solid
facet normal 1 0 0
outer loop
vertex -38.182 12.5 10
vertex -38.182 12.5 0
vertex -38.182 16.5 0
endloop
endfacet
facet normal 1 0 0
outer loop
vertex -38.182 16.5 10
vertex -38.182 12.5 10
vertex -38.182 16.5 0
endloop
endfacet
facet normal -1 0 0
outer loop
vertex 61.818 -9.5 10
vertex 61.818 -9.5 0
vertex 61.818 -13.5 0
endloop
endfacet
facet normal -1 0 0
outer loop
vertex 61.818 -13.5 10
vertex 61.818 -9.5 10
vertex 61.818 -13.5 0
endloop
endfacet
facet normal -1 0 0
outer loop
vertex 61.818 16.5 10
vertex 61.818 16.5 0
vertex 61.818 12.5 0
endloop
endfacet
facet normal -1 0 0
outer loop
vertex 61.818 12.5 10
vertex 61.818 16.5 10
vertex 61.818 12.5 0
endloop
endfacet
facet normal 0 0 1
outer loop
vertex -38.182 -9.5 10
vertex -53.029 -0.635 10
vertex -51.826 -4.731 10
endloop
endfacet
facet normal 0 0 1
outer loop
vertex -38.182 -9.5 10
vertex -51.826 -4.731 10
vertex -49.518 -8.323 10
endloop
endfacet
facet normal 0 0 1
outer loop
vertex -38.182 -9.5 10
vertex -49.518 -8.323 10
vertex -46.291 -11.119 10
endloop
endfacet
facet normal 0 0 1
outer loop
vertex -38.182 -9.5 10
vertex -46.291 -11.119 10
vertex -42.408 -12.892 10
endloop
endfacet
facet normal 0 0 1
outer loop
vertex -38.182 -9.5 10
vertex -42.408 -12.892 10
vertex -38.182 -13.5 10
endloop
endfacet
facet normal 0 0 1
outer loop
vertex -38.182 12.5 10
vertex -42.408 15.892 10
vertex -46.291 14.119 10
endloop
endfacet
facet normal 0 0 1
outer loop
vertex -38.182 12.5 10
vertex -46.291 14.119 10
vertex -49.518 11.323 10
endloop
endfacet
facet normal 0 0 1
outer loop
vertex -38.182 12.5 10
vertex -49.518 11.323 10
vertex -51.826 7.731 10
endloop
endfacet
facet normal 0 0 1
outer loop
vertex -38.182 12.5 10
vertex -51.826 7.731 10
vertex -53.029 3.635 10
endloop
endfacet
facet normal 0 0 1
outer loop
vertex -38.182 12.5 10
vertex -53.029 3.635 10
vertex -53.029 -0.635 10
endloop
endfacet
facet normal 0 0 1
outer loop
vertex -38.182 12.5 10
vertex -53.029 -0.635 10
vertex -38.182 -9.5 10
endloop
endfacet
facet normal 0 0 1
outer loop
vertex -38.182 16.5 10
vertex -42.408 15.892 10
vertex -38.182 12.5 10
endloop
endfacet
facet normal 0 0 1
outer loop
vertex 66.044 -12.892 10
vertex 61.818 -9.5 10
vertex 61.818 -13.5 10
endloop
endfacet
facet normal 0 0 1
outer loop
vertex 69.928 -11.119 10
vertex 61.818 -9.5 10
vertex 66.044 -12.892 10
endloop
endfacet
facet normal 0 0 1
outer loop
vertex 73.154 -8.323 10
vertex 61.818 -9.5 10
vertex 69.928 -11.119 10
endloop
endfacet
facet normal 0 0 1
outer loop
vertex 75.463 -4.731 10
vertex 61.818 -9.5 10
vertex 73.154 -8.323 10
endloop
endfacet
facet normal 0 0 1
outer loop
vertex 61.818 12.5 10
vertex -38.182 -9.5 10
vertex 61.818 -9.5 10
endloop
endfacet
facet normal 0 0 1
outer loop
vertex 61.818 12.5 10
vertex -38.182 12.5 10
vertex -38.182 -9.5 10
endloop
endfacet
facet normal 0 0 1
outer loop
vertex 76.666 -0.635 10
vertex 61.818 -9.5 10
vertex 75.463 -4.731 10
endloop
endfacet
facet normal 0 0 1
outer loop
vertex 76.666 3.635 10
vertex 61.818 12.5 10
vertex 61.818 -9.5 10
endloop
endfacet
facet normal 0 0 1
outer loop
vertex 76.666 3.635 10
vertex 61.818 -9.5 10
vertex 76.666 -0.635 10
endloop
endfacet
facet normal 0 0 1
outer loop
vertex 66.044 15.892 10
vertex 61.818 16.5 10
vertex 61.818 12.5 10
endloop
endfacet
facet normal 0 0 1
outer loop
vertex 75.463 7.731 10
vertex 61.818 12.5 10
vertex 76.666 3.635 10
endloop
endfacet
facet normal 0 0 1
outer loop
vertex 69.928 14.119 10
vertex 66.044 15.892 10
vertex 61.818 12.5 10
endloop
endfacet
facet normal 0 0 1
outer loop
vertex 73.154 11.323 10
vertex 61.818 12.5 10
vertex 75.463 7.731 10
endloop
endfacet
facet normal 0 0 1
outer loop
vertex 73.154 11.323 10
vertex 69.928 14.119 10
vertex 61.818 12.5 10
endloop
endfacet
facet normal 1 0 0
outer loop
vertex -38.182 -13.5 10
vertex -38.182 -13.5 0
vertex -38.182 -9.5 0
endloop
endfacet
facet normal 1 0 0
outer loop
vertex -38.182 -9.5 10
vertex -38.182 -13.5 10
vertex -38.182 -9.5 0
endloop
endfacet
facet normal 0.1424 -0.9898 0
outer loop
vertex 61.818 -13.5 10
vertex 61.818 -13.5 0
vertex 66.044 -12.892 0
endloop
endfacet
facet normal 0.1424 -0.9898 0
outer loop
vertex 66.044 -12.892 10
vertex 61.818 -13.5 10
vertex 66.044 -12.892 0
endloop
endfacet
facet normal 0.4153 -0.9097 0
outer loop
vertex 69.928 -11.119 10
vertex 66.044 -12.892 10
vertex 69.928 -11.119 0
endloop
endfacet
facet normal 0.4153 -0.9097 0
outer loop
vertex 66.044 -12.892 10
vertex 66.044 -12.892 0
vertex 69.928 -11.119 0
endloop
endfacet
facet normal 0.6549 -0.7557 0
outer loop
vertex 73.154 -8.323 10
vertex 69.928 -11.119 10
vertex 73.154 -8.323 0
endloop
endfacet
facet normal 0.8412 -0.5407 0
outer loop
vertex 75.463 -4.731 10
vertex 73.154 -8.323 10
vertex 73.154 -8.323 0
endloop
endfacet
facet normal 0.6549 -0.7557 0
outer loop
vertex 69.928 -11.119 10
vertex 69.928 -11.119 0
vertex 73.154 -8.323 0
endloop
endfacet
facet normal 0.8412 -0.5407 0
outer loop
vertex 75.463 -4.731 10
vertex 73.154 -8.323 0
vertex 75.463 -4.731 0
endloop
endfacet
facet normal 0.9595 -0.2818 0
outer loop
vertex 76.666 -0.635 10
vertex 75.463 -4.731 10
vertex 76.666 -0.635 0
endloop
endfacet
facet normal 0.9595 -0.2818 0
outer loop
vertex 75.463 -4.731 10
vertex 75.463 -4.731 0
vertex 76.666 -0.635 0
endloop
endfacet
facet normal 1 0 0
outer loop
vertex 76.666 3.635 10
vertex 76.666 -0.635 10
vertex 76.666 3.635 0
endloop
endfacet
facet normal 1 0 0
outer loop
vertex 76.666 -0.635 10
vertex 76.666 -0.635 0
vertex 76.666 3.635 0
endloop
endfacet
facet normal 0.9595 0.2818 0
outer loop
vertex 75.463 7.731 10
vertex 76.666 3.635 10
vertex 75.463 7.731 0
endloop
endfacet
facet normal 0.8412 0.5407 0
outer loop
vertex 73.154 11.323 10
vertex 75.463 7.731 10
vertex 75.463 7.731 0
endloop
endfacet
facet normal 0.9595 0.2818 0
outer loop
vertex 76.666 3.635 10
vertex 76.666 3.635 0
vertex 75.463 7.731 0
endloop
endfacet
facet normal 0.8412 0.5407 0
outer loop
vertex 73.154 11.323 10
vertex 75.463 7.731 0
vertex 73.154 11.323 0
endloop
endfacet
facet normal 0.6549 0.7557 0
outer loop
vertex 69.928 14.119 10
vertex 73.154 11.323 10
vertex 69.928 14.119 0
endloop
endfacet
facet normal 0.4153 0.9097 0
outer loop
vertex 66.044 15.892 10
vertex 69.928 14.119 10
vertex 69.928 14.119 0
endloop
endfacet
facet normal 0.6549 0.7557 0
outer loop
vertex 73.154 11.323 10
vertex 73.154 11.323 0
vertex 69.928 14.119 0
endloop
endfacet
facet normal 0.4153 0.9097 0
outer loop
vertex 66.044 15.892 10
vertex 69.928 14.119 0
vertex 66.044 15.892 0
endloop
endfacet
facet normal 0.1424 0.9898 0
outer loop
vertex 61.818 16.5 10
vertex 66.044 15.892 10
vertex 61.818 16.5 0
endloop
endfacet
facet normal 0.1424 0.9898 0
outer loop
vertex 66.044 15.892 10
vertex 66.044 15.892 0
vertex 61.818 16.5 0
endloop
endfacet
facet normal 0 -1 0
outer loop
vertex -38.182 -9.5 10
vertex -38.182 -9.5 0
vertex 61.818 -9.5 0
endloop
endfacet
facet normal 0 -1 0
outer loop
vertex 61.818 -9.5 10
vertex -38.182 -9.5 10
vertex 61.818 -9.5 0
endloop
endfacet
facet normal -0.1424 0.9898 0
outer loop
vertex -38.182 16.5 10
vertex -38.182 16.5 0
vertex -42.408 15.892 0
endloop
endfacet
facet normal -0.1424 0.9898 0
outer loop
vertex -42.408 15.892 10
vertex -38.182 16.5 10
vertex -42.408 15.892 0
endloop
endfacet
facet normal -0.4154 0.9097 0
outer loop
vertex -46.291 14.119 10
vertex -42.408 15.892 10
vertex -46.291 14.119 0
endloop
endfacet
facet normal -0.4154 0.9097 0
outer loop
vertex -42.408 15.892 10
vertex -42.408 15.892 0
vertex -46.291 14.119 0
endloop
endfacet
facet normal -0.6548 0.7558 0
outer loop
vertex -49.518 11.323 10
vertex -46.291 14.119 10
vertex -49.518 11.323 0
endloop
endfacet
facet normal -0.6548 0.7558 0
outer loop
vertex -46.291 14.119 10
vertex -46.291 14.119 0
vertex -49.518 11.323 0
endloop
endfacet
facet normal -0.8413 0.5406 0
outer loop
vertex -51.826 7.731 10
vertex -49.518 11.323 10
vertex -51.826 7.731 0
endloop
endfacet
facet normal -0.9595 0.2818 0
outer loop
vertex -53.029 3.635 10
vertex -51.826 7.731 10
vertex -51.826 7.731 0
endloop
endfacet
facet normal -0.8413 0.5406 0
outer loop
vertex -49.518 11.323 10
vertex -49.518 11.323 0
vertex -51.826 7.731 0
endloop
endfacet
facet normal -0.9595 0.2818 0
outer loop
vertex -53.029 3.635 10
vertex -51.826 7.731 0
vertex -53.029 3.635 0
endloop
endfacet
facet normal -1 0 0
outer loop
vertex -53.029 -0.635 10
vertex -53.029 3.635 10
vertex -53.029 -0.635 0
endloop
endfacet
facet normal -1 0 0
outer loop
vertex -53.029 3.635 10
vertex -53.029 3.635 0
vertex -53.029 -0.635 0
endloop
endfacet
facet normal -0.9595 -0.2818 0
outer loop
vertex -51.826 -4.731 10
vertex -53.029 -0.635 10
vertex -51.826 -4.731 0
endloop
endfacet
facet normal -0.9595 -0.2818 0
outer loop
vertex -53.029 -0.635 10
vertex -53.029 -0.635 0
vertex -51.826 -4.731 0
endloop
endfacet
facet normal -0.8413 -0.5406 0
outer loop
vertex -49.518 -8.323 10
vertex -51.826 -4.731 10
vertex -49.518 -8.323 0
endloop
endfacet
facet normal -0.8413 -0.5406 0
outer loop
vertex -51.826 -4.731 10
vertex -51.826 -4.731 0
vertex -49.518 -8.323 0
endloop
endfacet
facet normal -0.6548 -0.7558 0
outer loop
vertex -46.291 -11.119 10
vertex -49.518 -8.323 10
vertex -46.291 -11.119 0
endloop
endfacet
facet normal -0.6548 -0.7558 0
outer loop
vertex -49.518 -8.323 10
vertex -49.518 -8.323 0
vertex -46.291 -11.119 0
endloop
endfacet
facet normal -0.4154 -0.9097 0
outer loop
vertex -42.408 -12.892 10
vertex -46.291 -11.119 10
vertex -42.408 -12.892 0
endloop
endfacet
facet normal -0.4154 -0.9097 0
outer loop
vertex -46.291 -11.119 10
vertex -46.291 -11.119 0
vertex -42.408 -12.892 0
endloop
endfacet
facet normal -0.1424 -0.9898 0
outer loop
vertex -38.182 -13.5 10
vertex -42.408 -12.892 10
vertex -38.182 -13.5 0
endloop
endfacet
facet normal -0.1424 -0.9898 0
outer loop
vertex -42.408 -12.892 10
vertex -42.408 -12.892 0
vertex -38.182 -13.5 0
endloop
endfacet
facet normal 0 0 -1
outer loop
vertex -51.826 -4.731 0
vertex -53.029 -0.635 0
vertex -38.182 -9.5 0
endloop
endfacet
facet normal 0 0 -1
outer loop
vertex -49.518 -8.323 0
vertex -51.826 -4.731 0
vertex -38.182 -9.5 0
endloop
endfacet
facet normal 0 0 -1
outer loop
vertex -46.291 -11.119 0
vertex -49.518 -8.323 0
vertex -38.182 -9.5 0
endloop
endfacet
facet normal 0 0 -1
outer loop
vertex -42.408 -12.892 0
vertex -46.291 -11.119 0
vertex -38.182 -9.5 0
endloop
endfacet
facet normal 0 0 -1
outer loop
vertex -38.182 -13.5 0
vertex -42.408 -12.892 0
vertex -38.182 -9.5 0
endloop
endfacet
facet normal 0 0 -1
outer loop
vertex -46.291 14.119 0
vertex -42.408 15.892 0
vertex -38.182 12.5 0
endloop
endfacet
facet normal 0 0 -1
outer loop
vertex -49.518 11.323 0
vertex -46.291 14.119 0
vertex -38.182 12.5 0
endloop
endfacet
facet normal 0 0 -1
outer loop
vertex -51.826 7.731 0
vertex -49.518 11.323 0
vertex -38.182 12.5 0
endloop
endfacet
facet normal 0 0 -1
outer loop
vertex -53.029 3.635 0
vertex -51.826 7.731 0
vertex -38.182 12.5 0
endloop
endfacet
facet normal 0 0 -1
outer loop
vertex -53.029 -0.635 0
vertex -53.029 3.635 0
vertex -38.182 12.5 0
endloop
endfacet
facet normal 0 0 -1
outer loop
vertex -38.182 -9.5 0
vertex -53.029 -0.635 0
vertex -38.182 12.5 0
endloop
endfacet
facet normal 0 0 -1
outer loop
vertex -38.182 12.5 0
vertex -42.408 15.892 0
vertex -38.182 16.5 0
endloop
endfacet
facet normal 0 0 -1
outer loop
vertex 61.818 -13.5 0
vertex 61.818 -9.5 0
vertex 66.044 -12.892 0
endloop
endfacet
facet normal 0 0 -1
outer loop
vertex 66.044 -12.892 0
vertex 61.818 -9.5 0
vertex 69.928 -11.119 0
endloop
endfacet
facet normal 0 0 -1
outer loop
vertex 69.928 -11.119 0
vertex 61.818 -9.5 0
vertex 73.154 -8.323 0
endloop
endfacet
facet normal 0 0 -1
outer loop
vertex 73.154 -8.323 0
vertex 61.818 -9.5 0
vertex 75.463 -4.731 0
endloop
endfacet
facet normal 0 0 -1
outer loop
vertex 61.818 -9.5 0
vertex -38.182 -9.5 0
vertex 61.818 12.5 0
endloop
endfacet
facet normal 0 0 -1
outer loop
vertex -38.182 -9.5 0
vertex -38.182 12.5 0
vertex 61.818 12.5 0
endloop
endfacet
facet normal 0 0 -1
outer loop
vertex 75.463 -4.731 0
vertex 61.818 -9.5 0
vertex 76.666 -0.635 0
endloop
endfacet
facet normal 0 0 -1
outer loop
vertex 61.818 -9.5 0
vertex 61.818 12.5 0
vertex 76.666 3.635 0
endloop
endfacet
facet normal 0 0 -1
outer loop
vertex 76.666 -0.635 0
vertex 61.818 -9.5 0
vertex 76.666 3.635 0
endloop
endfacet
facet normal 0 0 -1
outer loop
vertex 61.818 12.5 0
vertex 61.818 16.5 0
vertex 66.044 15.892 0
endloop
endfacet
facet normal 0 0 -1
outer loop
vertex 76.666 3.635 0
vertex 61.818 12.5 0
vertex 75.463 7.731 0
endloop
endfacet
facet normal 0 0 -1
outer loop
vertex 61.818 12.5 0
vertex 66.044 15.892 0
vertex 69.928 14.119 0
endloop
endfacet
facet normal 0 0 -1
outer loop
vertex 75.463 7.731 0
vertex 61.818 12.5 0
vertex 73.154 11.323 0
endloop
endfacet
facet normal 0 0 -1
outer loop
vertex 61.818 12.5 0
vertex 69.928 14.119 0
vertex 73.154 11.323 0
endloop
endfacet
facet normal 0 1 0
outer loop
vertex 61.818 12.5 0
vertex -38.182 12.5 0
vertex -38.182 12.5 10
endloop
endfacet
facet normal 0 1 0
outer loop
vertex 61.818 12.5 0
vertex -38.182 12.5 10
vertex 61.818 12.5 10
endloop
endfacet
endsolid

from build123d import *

# Parameters (mm, degrees)
F0_W     = 100
F0_H     = 22
F1_DEPTH = 10


with BuildPart() as f1:
    # F0 (on Top) → F1 (new body)
    with BuildSketch(Plane.XY):
        with Locations((11.818181, 1.5)):
            Rectangle(F0_W, F0_H)
        with BuildLine():
            Line((-38.181819, -9.5), (-38.181819, 12.5))
            Line((-38.181819, 12.5), (-38.181819, 16.5))
            ThreePointArc((-38.181819, 16.5), (-53.181819, 1.5), (-38.181819, -13.5))
            Line((-38.181819, -13.5), (-38.181819, -9.5))
        make_face()
        with BuildLine():
            Line((61.818181, 16.5), (61.818181, 12.5))
            Line((61.818181, 12.5), (61.818181, -9.5))
            Line((61.818181, -9.5), (61.818181, -13.5))
            ThreePointArc((61.818181, -13.5), (76.818181, 1.5), (61.818181, 16.5))
        make_face()
    extrude(amount=F1_DEPTH)


solid = f1.part
